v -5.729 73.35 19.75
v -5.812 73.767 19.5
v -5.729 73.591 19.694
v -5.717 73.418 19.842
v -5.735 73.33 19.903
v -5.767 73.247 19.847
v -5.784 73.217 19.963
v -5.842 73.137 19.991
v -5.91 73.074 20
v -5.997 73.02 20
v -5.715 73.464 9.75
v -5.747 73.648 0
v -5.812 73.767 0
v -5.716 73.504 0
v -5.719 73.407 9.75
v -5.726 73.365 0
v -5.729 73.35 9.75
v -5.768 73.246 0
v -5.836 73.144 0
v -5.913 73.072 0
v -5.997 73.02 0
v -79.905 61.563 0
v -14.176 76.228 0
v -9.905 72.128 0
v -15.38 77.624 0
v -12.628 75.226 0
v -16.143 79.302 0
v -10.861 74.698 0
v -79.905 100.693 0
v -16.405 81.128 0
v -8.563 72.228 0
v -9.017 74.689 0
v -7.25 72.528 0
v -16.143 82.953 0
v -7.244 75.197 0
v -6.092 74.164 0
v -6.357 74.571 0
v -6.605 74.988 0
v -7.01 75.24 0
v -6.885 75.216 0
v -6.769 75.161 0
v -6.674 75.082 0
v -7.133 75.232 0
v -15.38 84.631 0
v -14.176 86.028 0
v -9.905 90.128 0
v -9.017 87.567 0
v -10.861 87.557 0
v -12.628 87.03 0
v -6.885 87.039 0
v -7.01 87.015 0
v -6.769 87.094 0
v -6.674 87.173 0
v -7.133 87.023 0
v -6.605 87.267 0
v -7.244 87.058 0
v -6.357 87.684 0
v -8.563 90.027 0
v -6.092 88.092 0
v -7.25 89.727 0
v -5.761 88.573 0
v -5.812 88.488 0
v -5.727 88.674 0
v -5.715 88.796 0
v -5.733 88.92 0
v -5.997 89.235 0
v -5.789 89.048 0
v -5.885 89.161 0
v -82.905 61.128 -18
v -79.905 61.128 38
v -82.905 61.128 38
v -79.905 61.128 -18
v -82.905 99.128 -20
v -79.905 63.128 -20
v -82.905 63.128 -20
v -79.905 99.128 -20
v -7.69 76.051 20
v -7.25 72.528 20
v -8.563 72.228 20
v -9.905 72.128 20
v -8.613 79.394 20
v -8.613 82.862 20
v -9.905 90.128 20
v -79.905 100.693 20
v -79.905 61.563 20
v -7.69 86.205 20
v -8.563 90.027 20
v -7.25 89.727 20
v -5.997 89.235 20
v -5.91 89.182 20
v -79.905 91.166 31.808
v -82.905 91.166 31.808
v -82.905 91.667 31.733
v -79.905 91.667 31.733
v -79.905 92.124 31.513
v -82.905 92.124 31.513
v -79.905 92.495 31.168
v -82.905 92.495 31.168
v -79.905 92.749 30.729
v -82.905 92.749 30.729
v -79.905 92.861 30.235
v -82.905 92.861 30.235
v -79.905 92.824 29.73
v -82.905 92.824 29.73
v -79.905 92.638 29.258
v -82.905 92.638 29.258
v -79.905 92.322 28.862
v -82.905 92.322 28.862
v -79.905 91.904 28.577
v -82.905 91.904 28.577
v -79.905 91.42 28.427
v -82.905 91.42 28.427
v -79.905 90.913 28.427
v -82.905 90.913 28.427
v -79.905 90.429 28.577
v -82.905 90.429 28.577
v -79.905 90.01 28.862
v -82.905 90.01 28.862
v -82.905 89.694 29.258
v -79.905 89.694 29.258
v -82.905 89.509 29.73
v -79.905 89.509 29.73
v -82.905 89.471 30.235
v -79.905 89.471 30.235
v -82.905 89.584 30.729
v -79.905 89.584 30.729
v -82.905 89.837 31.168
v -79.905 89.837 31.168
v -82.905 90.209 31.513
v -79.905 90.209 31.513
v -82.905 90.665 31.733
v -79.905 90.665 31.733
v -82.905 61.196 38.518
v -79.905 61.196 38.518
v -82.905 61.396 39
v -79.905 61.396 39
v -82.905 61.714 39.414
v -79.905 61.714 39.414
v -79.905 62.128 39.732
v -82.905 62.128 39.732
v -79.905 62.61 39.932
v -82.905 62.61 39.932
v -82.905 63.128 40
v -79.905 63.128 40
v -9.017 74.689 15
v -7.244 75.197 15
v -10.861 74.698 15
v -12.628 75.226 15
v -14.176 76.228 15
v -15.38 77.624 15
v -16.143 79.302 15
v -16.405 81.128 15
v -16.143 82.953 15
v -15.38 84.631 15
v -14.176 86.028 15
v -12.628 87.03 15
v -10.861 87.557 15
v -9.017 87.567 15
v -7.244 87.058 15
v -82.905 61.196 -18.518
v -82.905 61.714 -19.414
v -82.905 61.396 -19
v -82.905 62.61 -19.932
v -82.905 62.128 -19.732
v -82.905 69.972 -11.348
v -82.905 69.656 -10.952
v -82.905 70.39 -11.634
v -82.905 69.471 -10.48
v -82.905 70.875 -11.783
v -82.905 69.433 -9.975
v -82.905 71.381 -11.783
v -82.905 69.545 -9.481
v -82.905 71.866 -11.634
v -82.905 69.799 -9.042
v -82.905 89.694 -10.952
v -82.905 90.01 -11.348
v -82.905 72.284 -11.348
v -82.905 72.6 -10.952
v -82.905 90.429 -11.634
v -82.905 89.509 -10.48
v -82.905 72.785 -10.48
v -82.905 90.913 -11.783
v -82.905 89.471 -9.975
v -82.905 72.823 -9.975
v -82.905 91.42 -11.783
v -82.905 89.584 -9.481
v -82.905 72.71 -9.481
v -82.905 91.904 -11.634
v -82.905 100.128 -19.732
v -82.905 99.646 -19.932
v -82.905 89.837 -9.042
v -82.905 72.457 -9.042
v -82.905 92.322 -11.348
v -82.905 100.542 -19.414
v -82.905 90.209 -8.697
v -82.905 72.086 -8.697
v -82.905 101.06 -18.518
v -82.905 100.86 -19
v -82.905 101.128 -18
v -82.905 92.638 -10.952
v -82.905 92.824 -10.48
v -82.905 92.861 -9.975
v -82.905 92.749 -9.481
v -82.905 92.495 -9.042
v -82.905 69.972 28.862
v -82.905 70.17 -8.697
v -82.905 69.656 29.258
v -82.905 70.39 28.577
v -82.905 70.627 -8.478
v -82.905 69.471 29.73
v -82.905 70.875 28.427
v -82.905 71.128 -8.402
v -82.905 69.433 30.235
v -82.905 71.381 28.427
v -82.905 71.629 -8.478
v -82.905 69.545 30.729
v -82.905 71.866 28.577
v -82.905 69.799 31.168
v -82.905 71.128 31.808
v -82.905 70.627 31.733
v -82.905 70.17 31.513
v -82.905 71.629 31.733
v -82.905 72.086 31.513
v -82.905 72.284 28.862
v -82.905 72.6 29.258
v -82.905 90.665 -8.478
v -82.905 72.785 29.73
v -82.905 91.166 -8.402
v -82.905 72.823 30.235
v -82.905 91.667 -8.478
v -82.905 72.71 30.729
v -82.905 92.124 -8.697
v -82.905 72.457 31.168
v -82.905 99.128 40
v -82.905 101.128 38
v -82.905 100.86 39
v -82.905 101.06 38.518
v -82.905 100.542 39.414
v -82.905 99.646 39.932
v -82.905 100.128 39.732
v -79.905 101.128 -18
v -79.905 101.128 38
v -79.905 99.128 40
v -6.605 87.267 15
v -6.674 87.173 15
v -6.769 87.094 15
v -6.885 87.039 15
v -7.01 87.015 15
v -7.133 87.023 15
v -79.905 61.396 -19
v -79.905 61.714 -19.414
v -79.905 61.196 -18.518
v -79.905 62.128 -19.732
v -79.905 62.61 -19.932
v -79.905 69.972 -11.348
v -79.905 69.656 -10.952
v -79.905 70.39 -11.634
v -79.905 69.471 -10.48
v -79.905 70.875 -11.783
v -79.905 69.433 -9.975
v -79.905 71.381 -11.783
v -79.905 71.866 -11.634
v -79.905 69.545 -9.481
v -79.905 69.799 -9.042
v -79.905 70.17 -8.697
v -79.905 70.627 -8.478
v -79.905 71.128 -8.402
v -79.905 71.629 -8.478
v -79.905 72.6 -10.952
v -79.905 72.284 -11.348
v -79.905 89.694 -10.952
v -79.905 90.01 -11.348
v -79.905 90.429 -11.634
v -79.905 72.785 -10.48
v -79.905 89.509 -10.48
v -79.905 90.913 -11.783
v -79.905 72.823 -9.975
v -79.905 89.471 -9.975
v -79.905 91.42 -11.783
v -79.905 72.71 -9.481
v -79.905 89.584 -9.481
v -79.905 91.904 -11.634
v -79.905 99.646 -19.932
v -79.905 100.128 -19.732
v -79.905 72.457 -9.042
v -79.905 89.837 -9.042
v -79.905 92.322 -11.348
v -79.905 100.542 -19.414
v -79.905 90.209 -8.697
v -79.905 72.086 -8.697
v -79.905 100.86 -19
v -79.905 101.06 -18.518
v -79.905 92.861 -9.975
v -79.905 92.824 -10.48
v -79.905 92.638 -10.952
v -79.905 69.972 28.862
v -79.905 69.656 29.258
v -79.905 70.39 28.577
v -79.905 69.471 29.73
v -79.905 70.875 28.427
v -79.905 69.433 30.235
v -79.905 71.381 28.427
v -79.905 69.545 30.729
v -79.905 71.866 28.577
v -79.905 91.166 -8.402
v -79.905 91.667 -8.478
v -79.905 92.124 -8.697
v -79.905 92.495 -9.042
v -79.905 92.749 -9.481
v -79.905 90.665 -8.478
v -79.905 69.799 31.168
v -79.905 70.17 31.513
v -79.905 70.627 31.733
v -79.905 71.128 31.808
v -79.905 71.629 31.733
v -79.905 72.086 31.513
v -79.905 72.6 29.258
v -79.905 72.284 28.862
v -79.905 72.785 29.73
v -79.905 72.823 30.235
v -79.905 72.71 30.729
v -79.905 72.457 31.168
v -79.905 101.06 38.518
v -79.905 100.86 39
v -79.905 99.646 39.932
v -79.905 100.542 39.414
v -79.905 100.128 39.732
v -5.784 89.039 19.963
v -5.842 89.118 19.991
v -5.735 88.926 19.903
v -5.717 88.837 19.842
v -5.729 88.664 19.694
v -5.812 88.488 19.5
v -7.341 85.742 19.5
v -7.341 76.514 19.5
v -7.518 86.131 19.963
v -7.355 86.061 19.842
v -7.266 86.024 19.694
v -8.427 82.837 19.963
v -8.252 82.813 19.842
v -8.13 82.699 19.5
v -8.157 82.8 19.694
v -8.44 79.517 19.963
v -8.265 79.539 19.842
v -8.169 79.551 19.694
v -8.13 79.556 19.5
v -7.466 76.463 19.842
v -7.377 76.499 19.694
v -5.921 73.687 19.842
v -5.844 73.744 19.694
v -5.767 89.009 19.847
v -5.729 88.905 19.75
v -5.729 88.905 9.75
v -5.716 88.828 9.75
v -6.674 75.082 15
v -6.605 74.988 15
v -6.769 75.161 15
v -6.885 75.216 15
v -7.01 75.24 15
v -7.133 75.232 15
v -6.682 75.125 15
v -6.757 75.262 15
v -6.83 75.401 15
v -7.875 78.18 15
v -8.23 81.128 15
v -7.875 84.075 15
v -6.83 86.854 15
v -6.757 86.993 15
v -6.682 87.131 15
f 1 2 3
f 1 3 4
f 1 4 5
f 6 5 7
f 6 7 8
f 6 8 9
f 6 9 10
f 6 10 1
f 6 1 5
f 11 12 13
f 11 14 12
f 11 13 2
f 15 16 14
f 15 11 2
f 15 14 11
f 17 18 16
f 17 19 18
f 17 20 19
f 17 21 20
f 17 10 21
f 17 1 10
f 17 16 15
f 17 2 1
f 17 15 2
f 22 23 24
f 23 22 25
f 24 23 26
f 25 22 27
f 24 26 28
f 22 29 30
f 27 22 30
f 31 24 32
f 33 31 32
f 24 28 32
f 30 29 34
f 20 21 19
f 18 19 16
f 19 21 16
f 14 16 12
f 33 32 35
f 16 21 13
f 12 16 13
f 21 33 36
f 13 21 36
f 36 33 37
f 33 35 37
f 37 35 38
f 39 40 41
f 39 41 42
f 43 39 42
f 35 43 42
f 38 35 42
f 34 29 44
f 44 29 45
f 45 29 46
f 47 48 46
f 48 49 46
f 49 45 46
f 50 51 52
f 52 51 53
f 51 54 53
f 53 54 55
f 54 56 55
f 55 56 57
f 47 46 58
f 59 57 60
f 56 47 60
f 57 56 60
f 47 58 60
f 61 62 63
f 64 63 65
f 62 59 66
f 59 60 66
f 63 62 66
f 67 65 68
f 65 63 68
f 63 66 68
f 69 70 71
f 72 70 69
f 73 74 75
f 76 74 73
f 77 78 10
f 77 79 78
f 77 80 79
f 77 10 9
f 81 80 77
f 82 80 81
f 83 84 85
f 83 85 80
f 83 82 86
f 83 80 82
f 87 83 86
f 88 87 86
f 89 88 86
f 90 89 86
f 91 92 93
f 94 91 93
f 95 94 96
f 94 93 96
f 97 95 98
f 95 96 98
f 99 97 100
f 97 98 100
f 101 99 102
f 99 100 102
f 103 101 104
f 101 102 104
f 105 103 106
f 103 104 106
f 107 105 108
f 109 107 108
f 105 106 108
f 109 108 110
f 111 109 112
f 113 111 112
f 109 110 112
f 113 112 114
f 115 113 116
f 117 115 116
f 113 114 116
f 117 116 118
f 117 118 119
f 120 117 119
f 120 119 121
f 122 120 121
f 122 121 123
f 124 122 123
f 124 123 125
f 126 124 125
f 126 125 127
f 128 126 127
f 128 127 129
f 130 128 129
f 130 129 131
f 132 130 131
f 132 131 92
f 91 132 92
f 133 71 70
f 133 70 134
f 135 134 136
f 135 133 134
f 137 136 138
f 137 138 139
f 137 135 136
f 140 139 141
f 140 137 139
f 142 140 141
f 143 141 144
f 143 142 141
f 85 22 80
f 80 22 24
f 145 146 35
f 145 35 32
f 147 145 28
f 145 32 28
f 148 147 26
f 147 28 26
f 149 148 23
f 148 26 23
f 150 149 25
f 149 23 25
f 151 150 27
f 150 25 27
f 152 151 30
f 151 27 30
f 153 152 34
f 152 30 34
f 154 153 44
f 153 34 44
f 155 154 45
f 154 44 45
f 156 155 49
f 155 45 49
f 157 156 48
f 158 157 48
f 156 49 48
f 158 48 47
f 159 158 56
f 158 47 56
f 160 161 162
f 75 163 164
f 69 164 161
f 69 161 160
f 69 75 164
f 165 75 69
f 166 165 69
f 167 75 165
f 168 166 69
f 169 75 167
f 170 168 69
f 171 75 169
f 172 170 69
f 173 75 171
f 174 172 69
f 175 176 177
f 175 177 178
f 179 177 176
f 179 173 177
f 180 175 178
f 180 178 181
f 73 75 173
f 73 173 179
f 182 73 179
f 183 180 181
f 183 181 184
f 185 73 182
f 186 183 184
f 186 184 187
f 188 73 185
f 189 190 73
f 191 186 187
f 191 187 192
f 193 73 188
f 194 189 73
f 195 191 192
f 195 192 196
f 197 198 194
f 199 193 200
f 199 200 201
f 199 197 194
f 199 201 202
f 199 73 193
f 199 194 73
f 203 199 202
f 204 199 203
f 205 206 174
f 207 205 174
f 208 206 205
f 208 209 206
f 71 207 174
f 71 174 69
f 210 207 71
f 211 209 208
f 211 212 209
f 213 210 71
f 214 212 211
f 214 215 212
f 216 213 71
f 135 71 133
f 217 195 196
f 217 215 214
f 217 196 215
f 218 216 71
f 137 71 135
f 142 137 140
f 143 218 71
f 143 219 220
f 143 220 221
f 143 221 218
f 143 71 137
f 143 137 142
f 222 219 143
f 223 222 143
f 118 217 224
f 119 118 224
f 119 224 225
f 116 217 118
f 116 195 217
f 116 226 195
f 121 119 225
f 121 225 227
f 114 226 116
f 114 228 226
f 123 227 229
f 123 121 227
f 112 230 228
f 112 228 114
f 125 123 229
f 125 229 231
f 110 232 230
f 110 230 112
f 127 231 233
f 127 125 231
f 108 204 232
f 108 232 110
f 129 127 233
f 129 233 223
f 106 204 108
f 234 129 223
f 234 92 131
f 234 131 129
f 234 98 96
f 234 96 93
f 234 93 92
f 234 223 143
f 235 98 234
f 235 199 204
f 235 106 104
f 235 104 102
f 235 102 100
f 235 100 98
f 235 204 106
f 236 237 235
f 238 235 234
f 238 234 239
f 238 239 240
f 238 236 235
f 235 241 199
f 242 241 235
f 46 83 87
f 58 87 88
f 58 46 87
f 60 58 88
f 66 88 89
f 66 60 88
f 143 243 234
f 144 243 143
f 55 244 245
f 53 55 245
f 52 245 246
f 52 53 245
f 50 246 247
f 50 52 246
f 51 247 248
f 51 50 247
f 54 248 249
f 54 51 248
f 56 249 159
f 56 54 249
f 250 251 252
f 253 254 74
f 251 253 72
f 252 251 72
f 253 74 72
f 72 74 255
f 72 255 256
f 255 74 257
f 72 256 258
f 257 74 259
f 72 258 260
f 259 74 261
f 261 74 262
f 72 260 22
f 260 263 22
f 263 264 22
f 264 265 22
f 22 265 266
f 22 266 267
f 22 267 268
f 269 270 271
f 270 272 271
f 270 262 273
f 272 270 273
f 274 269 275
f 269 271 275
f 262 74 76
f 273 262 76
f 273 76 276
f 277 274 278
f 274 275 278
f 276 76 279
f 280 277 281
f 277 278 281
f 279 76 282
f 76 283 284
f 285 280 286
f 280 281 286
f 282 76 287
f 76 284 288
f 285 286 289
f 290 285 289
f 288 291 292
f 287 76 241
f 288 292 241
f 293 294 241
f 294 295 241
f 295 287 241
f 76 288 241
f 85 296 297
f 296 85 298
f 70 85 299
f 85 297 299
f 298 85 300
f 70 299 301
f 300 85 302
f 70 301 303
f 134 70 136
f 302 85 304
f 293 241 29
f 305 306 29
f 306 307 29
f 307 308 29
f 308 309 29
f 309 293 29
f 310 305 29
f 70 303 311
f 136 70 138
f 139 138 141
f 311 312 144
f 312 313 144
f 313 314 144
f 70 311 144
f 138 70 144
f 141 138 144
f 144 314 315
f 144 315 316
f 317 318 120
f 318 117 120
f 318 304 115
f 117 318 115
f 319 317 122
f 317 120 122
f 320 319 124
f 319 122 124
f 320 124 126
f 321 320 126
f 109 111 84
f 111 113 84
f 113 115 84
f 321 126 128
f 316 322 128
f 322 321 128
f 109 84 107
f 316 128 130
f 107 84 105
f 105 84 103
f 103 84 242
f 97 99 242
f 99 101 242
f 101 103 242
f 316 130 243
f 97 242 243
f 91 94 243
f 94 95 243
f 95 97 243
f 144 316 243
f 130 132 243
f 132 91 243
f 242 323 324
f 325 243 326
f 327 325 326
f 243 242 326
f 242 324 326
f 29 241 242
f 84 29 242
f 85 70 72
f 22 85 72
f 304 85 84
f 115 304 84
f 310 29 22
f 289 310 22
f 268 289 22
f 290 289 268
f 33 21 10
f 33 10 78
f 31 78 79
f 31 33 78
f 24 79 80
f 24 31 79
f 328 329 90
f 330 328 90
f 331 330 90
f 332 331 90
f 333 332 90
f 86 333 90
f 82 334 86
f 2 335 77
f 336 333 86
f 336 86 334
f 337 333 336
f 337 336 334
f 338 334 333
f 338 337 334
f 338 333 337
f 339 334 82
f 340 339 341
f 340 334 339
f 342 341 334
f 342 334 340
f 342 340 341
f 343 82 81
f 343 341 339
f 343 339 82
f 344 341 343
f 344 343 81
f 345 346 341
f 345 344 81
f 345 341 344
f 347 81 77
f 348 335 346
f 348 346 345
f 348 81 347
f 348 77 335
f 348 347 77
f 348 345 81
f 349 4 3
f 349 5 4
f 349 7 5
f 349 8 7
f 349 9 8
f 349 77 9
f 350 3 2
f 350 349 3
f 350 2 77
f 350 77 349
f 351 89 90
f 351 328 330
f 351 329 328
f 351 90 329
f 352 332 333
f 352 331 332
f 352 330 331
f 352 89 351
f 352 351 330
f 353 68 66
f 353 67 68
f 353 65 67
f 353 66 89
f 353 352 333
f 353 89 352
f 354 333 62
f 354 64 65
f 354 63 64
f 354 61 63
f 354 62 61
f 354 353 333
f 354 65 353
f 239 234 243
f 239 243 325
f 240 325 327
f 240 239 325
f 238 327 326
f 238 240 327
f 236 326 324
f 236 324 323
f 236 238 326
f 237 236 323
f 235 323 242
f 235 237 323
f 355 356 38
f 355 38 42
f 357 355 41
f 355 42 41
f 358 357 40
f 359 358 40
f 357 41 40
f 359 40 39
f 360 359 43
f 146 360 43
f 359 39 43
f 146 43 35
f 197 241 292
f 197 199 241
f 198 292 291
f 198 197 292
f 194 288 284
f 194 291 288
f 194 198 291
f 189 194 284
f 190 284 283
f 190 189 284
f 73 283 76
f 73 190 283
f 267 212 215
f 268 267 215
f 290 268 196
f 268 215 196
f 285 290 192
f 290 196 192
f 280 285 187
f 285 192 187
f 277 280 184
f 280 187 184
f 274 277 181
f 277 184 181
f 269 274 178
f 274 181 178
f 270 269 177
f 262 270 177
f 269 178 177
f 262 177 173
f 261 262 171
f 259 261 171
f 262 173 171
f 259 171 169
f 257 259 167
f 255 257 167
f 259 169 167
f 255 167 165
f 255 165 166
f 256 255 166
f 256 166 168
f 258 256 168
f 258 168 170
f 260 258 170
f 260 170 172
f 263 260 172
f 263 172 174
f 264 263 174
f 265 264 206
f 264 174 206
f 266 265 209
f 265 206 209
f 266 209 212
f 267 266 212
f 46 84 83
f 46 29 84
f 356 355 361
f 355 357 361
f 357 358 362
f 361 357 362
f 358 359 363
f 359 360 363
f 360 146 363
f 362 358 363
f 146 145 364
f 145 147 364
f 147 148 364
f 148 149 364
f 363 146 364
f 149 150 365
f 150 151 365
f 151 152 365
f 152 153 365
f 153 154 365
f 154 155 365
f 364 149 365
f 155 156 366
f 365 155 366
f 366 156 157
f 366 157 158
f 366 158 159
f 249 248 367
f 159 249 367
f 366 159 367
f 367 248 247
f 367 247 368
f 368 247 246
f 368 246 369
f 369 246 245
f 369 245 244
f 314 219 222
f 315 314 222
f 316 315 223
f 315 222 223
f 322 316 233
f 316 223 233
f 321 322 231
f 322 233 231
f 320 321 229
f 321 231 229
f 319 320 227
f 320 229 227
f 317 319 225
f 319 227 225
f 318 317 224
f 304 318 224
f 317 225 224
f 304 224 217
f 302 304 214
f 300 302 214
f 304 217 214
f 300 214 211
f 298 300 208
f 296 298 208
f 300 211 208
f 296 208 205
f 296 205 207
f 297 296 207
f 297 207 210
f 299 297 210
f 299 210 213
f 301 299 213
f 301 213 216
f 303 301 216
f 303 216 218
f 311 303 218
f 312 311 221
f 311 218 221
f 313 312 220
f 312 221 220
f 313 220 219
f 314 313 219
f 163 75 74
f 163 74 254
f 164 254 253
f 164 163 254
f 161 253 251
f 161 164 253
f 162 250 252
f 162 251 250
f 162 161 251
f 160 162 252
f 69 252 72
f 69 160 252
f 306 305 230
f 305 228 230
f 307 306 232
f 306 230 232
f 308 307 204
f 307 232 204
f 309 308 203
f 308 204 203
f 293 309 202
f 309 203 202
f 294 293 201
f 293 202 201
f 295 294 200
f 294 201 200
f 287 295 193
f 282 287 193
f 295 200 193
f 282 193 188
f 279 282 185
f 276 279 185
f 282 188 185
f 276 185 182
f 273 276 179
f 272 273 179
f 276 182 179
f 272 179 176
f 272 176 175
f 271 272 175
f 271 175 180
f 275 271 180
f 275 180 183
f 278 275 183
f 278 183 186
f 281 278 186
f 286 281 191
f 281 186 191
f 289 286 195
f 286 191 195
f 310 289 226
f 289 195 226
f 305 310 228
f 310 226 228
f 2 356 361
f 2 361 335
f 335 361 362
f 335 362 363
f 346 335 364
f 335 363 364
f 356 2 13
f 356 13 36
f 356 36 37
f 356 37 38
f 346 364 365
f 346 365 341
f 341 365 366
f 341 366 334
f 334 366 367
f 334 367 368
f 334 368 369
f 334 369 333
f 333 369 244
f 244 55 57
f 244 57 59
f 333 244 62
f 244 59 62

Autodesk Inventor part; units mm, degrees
ref_plane "YZ Plane" through (0, 0, 0) normal (1, 0, 0) x (0, 1, 0)
ref_plane "XZ Plane" through (0, 0, 0) normal (0, 1, 0) x (-1, 0, 0)
ref_plane "XY Plane" through (0, 0, 0) normal (0, 0, 1) x (1, 0, 0)
ref_plane "Plano de trabajo1" through (0, 0, 0) normal (0, 0, 1) x (1, 0, 0)
sketch "Boceto1" plane through (0, 0, 0) normal (0, 0, 1) x (1, 0, 0)
  circle A0 centre (-9.9048, 81.1277) radius 6.5
  line L0 (-79.9048, 100.693) -> (-79.9048, 87.6277)
  line L1 (-79.9048, 74.6277) -> (-79.9048, 61.5627)
  line L2 (-79.9048, 87.6277) -> (-79.9048, 74.6277)
  circle A1 centre (-9.9048, 81.1277) radius 9
  line L3 (-79.9048, 100.693) -> (-9.9048, 90.1277)
  line L4 (-79.9048, 61.5627) -> (-9.9048, 72.1277)
  point P0 (0, 0)
  dimension "d0" = 13
  dimension "d2" = 13.065
  dimension "d3" = 18
extrude "Extrusión1" add sketch "Boceto1" along normal blind 20
sketch "Boceto2" plane through (-79.9048, 61.5627, 0) normal (-1, 0, 0) x (0, 0, 1)
  line L0 (0, 39.1303) -> (0, 0) projected
  line L1 (20, 39.1303) -> (20, 0) projected
  line L2 (0, 39.1303) -> (20, 0)
  line L3 (20, 39.1303) -> (0, 0)
  line L4 (40, -0.4348) -> (-20, -0.4348)
  line L5 (-20, -0.4348) -> (-20, 39.5652)
  line L6 (-20, 39.5652) -> (40, 39.5652)
  line L7 (40, 39.5652) -> (40, -0.4348)
  line L8 (40, -0.4348) -> (-20, 39.5652) construction
  line L9 (-20, -0.4348) -> (40, 39.5652) construction
  point P0 (0, -61.5627)
  point P1 (10, 19.5652)
  dimension "d6" = 60
  dimension "d7" = 40
extrude "Extrusión2" add sketch "Boceto2" along normal blind 3 contours L2 L3 L0 | L3 L1 L2 | L4 L5 L6 L7
fillet "Empalme1" radius 2 4 edges at (-81.4048, 101.1278, -20) (-81.4048, 101.1278, 40) (-81.4048, 61.1278, -20) (-81.4048, 61.1278, 40)
sketch "Boceto4" plane through (-82.9048, 61.5627, 0) normal (-1, 0, 0) x (0, 0, 1)
  line L0 (-10.1021, 39.6035) -> (-10.1021, 29.6035)
  line L1 (-10.1021, 29.6035) -> (-20.1021, 29.6035)
  circle A0 centre (-10.1021, 29.6035) radius 1.7
  line L2 (-10.1021, 29.6035) -> (-10.1021, -0.4348)
  line L3 (38, -0.4348) -> (-18, -0.4348) projected
  line L4 (-10.1021, -0.4348) -> (-10.1021, 9.5652)
  line L5 (-10.1021, 9.5652) -> (40.1083, 9.5652)
  line L6 (40.1083, 9.5652) -> (30.1083, 9.5652)
  line L7 (30.1083, 9.5652) -> (30.1083, 39.6035)
  line L8 (30.1083, 39.6035) -> (30.1083, 29.6035)
  circle A1 centre (-10.1021, 9.5652) radius 1.7
  circle A2 centre (30.1083, 9.5652) radius 1.7
  circle A3 centre (30.1083, 29.6035) radius 1.7
  point P0 (0, -61.5627)
  dimension "d11" = 10
  dimension "d12" = 10
  dimension "d13" = 3.4
  dimension "d14" = 10
  dimension "d15" = 10
  dimension "d16" = 10
  dimension "d17" = 3.4
  dimension "d18" = 3.4
  dimension "d19" = 3.4
extrude "Extrusión3" cut sketch "Boceto4" against normal blind 3
sketch "Boceto5" plane through (0, 0, 20) normal (0, 0, 1) x (1, 0, 0)
  circle A0 centre (-9.8912, 81.0888) radius 7
  point P0 (0, 0)
  dimension "d22" = 14
extrude "Extrusión4" add sketch "Boceto5" against normal blind 5
sketch "Boceto6" plane through (0, 0, 0) normal (0, 0, -1) x (-1, 0, 0)
  circle A0 centre (-4.1803, 81.1277) radius 12.4106
  point P0 (0, 0)
extrude "Extrusión5" cut sketch "Boceto6" against normal blind 20
fillet "Empalme2" radius 0.5 5 edges at (-6.83, 75.4009, 7.5) (-6.83, 86.8544, 7.5) (-5.4544, 88.9504, 10) (-5.4544, 73.305, 10) (-8.2303, 81.1277, 20)
properties part number "soporte"
